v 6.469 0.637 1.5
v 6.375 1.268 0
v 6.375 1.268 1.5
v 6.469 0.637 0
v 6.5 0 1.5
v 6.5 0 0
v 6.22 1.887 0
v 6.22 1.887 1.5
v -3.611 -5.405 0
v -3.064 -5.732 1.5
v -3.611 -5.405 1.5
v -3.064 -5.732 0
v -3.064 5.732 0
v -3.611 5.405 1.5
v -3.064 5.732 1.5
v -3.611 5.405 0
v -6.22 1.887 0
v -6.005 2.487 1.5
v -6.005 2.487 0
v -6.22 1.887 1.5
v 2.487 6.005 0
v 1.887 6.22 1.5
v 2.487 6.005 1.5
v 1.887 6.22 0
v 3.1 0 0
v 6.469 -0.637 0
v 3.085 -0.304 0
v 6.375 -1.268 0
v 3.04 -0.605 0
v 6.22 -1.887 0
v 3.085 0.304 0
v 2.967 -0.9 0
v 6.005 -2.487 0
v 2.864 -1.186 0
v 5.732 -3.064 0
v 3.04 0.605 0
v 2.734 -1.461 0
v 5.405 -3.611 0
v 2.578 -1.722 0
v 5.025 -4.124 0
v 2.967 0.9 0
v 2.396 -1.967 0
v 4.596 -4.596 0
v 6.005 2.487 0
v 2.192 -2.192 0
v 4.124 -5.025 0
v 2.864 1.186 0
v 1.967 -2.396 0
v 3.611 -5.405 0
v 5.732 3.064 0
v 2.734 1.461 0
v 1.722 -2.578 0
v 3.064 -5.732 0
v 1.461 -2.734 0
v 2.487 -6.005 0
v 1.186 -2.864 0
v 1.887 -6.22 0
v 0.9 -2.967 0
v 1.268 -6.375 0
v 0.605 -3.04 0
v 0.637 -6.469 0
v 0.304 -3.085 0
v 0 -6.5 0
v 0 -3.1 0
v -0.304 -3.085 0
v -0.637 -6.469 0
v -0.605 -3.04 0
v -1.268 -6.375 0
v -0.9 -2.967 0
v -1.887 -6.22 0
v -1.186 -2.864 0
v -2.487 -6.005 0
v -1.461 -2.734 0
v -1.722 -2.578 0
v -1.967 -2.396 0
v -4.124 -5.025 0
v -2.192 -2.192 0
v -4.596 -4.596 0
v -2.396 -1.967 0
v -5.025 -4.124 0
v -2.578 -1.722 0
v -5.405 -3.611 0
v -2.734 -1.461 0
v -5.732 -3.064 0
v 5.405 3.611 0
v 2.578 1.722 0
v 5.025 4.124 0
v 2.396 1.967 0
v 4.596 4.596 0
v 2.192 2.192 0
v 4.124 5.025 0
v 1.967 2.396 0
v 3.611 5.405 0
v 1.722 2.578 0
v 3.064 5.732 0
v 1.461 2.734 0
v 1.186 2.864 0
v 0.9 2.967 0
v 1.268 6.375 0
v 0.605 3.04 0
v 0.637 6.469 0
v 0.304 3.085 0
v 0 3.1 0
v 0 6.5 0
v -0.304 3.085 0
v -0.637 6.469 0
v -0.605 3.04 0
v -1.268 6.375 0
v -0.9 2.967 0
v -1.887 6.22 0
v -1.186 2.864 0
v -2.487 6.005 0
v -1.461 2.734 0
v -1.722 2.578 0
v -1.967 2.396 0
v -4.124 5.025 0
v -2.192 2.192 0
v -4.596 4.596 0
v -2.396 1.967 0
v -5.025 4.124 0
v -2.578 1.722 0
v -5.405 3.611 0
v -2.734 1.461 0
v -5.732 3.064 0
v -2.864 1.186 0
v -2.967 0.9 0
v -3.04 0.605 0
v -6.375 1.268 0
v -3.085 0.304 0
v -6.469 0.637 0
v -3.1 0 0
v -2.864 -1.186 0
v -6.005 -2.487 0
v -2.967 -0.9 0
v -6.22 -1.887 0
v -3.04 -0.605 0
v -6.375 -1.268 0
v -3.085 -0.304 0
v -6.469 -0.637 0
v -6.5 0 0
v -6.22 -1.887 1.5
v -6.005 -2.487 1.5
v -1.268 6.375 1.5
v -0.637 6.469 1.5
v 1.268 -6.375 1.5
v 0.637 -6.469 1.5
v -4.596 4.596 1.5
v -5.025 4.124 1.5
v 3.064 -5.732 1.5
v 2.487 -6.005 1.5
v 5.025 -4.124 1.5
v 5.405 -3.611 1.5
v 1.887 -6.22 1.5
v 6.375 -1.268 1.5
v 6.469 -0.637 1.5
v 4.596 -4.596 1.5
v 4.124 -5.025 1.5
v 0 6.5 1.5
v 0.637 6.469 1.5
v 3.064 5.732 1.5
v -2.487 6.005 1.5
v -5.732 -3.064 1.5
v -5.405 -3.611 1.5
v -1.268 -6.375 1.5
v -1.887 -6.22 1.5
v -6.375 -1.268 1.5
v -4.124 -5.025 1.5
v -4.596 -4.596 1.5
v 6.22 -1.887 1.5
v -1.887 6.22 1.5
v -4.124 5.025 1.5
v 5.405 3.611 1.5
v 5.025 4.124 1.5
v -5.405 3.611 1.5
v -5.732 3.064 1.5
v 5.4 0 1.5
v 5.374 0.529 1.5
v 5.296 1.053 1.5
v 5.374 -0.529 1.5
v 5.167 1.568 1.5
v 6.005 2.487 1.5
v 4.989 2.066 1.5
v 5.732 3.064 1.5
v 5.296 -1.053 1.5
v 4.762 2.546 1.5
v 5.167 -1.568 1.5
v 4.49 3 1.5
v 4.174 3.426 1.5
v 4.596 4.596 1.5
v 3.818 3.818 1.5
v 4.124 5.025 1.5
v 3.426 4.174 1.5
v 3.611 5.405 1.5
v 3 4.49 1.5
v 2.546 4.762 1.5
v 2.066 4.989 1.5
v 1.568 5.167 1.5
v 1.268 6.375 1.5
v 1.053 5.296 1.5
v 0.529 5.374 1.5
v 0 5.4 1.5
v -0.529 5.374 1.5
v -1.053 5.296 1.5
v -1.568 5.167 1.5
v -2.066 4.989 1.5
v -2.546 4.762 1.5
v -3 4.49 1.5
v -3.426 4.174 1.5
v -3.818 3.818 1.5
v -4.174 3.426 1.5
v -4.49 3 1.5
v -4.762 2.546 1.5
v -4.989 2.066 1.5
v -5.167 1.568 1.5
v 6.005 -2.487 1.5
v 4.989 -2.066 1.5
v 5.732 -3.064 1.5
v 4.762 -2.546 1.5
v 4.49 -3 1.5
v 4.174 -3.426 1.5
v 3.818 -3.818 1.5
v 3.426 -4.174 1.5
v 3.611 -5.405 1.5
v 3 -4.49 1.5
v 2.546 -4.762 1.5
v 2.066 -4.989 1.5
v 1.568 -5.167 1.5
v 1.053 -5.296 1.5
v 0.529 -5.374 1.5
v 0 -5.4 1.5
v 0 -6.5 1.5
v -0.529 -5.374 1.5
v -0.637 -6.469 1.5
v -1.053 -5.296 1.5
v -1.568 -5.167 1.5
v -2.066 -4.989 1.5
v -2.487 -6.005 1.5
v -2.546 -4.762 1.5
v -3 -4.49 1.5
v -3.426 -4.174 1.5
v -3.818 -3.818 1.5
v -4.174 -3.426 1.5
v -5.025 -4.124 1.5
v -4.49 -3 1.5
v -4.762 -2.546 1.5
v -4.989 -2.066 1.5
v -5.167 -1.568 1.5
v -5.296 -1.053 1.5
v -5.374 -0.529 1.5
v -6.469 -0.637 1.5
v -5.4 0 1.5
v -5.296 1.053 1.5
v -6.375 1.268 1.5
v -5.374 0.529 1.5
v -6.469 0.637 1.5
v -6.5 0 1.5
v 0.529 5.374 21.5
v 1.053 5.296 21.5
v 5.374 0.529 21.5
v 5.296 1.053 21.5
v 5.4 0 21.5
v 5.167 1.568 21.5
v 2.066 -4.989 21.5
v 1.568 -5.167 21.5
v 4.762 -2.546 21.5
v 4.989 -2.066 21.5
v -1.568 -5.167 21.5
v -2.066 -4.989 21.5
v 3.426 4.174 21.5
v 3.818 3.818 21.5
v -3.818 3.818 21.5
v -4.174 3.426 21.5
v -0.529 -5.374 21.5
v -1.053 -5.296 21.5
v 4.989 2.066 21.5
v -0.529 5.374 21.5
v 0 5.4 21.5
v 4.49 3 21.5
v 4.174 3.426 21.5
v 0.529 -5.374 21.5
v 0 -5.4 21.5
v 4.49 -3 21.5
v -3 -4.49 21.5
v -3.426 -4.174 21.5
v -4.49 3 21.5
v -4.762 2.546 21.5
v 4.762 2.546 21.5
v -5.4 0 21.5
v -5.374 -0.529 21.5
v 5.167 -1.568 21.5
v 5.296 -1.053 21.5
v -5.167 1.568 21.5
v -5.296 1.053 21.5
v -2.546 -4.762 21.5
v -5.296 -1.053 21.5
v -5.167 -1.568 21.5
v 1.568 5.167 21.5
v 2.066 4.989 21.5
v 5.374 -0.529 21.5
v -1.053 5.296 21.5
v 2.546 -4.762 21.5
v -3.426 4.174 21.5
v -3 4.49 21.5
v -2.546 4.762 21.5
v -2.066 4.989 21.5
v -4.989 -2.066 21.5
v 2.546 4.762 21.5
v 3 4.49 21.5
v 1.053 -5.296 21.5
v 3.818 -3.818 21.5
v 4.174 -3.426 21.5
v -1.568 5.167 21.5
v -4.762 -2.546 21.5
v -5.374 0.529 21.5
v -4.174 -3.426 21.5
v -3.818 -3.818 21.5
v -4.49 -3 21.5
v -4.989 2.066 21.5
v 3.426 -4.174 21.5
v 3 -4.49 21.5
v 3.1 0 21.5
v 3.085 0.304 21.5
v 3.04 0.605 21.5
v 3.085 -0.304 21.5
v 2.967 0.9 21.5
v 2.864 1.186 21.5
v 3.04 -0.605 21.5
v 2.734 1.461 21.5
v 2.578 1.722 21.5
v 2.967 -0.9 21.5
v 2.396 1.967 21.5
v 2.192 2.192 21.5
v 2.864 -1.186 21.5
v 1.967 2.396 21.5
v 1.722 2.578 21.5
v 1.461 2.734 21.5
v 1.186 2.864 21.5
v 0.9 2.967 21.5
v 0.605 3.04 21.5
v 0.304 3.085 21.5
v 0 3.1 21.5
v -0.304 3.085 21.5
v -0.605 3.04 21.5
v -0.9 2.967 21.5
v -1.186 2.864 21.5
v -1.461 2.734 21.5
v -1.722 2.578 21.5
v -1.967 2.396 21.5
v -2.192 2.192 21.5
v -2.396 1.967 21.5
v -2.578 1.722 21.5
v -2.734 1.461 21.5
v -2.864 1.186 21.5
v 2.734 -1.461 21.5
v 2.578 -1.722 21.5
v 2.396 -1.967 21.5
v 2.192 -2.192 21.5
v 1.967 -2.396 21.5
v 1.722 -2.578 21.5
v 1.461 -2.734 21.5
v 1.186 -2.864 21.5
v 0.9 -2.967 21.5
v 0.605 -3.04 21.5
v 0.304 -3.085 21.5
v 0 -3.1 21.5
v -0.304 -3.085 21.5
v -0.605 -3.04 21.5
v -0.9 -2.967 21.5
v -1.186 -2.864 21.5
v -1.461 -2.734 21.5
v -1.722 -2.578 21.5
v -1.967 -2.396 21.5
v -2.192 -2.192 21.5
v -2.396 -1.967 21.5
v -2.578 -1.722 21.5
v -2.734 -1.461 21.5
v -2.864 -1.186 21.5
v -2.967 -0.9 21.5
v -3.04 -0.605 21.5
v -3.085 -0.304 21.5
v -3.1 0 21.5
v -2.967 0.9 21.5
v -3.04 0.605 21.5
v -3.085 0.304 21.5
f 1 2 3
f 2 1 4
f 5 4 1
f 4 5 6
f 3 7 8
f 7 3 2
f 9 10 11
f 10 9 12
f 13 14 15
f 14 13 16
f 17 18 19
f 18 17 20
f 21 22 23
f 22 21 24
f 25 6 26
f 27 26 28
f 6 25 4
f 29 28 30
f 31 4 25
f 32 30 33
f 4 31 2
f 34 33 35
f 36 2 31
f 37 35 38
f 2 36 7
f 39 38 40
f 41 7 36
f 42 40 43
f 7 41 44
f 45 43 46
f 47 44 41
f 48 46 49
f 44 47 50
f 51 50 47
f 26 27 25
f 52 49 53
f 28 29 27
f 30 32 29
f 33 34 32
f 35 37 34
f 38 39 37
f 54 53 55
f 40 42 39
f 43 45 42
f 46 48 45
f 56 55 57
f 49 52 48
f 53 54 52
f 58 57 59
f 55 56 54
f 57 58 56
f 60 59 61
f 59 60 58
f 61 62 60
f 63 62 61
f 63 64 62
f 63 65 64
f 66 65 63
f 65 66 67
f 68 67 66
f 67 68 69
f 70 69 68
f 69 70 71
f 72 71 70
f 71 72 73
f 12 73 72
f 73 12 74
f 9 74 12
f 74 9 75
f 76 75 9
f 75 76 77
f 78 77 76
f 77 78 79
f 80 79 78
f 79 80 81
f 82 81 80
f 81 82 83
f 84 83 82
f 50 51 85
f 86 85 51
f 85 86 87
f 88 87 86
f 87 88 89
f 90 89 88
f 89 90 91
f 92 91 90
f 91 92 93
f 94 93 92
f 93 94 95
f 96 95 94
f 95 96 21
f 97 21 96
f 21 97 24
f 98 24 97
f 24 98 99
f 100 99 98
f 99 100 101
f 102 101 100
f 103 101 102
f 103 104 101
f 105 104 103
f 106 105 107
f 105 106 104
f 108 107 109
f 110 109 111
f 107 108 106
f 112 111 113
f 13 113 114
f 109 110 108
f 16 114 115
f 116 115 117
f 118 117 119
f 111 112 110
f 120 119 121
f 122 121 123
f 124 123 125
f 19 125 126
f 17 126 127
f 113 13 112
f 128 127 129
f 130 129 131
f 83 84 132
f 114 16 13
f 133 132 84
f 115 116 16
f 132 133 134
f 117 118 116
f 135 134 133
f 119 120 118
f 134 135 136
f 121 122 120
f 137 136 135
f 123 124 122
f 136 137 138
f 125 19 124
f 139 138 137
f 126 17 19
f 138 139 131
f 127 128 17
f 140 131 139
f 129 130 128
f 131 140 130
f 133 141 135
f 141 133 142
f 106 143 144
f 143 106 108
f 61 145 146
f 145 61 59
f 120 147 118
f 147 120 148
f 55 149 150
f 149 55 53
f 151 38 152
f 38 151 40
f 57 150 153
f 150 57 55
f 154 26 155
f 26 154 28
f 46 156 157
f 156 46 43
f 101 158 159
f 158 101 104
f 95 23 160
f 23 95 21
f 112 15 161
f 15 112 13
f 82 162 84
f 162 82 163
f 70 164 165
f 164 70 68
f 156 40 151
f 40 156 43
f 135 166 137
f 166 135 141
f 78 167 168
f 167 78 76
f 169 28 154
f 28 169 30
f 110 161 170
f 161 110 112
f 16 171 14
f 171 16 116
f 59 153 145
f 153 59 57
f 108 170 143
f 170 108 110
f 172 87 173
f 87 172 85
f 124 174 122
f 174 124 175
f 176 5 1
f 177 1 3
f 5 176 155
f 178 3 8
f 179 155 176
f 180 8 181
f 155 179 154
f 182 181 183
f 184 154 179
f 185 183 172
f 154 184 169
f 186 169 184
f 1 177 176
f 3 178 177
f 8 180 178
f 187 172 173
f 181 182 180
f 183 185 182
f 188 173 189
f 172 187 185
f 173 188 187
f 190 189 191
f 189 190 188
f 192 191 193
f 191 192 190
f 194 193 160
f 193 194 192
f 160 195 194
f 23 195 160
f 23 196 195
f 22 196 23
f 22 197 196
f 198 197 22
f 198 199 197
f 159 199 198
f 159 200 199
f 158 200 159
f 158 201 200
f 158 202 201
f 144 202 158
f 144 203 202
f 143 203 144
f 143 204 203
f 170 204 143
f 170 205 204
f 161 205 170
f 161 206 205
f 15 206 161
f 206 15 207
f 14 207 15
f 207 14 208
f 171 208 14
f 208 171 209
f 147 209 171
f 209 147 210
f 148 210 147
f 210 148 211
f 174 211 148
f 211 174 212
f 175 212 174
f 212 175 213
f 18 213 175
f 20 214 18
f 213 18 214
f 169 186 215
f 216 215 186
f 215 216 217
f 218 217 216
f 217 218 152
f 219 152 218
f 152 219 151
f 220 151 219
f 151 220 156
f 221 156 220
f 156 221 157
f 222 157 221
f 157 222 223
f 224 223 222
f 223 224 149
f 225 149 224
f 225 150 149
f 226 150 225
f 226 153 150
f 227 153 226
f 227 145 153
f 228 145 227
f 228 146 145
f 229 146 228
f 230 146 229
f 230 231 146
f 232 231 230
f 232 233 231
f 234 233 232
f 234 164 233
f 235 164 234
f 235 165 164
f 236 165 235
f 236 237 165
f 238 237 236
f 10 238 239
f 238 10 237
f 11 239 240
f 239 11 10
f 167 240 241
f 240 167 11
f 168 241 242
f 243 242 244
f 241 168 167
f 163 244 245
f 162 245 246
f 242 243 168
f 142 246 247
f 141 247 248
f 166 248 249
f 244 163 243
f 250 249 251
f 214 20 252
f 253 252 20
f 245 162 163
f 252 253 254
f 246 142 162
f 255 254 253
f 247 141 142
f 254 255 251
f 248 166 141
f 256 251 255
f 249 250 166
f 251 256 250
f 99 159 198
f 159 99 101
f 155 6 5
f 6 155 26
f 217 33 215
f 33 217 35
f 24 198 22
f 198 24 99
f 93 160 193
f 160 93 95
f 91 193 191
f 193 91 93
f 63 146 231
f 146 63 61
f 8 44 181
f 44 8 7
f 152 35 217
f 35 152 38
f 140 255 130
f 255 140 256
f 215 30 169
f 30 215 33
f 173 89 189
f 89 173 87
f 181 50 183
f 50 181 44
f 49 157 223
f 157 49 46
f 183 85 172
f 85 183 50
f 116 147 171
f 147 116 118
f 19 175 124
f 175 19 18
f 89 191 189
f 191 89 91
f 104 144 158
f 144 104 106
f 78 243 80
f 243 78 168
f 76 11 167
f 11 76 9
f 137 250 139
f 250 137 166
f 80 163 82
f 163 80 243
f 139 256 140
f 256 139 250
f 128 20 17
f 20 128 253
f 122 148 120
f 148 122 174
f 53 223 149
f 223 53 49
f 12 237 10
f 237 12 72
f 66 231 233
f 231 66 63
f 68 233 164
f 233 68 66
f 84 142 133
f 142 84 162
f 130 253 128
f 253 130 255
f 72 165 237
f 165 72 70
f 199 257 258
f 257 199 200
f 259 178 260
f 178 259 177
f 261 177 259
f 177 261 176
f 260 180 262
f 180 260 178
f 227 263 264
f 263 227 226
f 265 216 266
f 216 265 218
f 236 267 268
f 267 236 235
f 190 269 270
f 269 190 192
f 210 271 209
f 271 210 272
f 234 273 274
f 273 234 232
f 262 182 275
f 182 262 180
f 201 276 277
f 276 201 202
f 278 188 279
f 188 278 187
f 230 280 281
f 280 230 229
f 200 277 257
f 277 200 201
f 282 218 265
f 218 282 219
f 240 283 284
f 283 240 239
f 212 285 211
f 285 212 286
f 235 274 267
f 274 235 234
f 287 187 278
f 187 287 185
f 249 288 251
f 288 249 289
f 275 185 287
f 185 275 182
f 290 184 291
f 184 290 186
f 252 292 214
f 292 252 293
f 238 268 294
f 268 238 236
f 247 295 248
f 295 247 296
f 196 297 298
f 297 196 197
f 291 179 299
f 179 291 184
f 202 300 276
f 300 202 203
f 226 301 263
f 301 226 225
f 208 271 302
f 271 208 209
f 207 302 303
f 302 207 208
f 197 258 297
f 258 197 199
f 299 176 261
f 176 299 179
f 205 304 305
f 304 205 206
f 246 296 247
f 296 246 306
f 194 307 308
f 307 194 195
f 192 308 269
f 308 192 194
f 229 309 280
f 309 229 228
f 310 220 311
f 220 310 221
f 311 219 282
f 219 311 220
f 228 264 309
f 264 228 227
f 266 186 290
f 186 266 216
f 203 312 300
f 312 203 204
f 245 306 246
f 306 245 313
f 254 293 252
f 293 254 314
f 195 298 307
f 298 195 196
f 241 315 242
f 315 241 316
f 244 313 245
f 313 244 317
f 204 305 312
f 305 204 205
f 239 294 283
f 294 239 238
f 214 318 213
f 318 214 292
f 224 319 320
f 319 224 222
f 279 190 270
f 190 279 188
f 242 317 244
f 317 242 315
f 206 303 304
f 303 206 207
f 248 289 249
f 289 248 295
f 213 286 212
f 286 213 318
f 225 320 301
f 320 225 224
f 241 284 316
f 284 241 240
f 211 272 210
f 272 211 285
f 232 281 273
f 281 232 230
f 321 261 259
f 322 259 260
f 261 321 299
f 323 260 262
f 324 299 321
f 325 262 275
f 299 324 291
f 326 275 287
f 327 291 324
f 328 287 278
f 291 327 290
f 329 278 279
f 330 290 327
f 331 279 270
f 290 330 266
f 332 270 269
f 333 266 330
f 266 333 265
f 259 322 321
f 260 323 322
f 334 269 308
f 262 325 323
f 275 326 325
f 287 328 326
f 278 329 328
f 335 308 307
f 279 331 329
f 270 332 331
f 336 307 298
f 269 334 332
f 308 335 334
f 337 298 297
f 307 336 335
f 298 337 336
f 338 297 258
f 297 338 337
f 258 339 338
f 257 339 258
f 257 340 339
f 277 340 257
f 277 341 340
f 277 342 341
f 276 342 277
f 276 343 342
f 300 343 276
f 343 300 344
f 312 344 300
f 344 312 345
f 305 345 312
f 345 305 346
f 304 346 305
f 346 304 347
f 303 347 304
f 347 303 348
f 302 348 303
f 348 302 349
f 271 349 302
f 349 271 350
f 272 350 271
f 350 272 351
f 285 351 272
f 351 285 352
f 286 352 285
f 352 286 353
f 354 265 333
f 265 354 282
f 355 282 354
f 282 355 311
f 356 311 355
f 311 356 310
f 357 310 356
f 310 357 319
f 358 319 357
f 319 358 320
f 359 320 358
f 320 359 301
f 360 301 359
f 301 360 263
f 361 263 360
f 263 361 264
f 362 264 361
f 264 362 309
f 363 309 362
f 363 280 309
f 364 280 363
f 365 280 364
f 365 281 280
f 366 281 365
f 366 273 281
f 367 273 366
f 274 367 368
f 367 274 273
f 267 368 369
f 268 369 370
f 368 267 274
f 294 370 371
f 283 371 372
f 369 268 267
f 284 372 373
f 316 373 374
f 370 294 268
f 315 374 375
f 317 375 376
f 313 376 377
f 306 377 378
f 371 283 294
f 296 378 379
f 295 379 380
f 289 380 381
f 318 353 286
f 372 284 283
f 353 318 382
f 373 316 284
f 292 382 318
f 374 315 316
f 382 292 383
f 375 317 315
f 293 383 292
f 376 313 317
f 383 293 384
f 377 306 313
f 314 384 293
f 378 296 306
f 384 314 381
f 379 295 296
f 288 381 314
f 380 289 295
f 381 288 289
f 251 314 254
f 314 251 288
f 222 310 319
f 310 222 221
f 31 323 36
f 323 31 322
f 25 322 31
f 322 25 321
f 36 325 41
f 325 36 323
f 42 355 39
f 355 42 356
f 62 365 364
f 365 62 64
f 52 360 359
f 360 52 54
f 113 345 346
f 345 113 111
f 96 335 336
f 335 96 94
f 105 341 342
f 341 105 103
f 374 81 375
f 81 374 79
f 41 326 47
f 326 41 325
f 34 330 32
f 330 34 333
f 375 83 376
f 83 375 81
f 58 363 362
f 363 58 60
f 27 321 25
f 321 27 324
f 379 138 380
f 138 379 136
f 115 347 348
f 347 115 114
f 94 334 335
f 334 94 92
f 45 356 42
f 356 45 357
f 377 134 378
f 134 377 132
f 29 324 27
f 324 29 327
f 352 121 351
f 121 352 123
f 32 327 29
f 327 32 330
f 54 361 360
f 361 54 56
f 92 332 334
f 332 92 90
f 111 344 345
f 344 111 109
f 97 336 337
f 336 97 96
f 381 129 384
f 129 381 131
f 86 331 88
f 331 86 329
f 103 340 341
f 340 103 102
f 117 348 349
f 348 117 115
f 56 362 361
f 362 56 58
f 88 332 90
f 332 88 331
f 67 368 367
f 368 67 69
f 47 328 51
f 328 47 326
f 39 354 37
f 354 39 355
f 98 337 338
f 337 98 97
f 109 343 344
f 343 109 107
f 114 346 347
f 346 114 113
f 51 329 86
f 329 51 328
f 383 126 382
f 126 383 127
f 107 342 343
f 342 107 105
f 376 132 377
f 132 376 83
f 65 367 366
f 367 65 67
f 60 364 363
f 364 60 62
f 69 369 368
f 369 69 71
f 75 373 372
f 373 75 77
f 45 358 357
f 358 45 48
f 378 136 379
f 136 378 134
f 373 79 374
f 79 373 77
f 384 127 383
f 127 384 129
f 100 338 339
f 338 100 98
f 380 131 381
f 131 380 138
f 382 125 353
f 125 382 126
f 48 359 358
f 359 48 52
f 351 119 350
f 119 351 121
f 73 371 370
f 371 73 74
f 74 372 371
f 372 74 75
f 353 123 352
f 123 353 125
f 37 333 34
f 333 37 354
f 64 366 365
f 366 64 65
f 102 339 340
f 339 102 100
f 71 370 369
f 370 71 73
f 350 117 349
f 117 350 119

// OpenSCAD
// Adapter sleeve: 0.2 mL PCR tube in 1.5 mL rack hole
// Print orientation: collar on bed (z=0), sleeve rises upward

// --- Dimensions (mm) ---
COLLAR_OD       = 13.0;   // Collar outer diameter
COLLAR_THICK    = 1.5;    // Collar thickness (z-height)
SLEEVE_OD       = 10.8;   // Sleeve outer diameter
SLEEVE_HEIGHT   = 21.5;  // Total height from z=0 to top
BORE_DIA         = 6.2;   // Inner bore diameter

// --- Derived ---
COLLAR_R         = COLLAR_OD / 2;
SLEEVE_R         = SLEEVE_OD / 2;
BORE_R           = BORE_DIA / 2;

// --- Build ---
difference() {
    union() {
        // Collar (on bed)
        cylinder(h = COLLAR_THICK, r = COLLAR_R, $fn = 64);
        // Sleeve body (rises from collar to total height)
        cylinder(h = SLEEVE_HEIGHT, r = SLEEVE_R, $fn = 64);
    }
    // Bore through full height (extend slightly past faces)
    cylinder(h = SLEEVE_HEIGHT + 0.02, r = BORE_R, $fn = 64);
}
